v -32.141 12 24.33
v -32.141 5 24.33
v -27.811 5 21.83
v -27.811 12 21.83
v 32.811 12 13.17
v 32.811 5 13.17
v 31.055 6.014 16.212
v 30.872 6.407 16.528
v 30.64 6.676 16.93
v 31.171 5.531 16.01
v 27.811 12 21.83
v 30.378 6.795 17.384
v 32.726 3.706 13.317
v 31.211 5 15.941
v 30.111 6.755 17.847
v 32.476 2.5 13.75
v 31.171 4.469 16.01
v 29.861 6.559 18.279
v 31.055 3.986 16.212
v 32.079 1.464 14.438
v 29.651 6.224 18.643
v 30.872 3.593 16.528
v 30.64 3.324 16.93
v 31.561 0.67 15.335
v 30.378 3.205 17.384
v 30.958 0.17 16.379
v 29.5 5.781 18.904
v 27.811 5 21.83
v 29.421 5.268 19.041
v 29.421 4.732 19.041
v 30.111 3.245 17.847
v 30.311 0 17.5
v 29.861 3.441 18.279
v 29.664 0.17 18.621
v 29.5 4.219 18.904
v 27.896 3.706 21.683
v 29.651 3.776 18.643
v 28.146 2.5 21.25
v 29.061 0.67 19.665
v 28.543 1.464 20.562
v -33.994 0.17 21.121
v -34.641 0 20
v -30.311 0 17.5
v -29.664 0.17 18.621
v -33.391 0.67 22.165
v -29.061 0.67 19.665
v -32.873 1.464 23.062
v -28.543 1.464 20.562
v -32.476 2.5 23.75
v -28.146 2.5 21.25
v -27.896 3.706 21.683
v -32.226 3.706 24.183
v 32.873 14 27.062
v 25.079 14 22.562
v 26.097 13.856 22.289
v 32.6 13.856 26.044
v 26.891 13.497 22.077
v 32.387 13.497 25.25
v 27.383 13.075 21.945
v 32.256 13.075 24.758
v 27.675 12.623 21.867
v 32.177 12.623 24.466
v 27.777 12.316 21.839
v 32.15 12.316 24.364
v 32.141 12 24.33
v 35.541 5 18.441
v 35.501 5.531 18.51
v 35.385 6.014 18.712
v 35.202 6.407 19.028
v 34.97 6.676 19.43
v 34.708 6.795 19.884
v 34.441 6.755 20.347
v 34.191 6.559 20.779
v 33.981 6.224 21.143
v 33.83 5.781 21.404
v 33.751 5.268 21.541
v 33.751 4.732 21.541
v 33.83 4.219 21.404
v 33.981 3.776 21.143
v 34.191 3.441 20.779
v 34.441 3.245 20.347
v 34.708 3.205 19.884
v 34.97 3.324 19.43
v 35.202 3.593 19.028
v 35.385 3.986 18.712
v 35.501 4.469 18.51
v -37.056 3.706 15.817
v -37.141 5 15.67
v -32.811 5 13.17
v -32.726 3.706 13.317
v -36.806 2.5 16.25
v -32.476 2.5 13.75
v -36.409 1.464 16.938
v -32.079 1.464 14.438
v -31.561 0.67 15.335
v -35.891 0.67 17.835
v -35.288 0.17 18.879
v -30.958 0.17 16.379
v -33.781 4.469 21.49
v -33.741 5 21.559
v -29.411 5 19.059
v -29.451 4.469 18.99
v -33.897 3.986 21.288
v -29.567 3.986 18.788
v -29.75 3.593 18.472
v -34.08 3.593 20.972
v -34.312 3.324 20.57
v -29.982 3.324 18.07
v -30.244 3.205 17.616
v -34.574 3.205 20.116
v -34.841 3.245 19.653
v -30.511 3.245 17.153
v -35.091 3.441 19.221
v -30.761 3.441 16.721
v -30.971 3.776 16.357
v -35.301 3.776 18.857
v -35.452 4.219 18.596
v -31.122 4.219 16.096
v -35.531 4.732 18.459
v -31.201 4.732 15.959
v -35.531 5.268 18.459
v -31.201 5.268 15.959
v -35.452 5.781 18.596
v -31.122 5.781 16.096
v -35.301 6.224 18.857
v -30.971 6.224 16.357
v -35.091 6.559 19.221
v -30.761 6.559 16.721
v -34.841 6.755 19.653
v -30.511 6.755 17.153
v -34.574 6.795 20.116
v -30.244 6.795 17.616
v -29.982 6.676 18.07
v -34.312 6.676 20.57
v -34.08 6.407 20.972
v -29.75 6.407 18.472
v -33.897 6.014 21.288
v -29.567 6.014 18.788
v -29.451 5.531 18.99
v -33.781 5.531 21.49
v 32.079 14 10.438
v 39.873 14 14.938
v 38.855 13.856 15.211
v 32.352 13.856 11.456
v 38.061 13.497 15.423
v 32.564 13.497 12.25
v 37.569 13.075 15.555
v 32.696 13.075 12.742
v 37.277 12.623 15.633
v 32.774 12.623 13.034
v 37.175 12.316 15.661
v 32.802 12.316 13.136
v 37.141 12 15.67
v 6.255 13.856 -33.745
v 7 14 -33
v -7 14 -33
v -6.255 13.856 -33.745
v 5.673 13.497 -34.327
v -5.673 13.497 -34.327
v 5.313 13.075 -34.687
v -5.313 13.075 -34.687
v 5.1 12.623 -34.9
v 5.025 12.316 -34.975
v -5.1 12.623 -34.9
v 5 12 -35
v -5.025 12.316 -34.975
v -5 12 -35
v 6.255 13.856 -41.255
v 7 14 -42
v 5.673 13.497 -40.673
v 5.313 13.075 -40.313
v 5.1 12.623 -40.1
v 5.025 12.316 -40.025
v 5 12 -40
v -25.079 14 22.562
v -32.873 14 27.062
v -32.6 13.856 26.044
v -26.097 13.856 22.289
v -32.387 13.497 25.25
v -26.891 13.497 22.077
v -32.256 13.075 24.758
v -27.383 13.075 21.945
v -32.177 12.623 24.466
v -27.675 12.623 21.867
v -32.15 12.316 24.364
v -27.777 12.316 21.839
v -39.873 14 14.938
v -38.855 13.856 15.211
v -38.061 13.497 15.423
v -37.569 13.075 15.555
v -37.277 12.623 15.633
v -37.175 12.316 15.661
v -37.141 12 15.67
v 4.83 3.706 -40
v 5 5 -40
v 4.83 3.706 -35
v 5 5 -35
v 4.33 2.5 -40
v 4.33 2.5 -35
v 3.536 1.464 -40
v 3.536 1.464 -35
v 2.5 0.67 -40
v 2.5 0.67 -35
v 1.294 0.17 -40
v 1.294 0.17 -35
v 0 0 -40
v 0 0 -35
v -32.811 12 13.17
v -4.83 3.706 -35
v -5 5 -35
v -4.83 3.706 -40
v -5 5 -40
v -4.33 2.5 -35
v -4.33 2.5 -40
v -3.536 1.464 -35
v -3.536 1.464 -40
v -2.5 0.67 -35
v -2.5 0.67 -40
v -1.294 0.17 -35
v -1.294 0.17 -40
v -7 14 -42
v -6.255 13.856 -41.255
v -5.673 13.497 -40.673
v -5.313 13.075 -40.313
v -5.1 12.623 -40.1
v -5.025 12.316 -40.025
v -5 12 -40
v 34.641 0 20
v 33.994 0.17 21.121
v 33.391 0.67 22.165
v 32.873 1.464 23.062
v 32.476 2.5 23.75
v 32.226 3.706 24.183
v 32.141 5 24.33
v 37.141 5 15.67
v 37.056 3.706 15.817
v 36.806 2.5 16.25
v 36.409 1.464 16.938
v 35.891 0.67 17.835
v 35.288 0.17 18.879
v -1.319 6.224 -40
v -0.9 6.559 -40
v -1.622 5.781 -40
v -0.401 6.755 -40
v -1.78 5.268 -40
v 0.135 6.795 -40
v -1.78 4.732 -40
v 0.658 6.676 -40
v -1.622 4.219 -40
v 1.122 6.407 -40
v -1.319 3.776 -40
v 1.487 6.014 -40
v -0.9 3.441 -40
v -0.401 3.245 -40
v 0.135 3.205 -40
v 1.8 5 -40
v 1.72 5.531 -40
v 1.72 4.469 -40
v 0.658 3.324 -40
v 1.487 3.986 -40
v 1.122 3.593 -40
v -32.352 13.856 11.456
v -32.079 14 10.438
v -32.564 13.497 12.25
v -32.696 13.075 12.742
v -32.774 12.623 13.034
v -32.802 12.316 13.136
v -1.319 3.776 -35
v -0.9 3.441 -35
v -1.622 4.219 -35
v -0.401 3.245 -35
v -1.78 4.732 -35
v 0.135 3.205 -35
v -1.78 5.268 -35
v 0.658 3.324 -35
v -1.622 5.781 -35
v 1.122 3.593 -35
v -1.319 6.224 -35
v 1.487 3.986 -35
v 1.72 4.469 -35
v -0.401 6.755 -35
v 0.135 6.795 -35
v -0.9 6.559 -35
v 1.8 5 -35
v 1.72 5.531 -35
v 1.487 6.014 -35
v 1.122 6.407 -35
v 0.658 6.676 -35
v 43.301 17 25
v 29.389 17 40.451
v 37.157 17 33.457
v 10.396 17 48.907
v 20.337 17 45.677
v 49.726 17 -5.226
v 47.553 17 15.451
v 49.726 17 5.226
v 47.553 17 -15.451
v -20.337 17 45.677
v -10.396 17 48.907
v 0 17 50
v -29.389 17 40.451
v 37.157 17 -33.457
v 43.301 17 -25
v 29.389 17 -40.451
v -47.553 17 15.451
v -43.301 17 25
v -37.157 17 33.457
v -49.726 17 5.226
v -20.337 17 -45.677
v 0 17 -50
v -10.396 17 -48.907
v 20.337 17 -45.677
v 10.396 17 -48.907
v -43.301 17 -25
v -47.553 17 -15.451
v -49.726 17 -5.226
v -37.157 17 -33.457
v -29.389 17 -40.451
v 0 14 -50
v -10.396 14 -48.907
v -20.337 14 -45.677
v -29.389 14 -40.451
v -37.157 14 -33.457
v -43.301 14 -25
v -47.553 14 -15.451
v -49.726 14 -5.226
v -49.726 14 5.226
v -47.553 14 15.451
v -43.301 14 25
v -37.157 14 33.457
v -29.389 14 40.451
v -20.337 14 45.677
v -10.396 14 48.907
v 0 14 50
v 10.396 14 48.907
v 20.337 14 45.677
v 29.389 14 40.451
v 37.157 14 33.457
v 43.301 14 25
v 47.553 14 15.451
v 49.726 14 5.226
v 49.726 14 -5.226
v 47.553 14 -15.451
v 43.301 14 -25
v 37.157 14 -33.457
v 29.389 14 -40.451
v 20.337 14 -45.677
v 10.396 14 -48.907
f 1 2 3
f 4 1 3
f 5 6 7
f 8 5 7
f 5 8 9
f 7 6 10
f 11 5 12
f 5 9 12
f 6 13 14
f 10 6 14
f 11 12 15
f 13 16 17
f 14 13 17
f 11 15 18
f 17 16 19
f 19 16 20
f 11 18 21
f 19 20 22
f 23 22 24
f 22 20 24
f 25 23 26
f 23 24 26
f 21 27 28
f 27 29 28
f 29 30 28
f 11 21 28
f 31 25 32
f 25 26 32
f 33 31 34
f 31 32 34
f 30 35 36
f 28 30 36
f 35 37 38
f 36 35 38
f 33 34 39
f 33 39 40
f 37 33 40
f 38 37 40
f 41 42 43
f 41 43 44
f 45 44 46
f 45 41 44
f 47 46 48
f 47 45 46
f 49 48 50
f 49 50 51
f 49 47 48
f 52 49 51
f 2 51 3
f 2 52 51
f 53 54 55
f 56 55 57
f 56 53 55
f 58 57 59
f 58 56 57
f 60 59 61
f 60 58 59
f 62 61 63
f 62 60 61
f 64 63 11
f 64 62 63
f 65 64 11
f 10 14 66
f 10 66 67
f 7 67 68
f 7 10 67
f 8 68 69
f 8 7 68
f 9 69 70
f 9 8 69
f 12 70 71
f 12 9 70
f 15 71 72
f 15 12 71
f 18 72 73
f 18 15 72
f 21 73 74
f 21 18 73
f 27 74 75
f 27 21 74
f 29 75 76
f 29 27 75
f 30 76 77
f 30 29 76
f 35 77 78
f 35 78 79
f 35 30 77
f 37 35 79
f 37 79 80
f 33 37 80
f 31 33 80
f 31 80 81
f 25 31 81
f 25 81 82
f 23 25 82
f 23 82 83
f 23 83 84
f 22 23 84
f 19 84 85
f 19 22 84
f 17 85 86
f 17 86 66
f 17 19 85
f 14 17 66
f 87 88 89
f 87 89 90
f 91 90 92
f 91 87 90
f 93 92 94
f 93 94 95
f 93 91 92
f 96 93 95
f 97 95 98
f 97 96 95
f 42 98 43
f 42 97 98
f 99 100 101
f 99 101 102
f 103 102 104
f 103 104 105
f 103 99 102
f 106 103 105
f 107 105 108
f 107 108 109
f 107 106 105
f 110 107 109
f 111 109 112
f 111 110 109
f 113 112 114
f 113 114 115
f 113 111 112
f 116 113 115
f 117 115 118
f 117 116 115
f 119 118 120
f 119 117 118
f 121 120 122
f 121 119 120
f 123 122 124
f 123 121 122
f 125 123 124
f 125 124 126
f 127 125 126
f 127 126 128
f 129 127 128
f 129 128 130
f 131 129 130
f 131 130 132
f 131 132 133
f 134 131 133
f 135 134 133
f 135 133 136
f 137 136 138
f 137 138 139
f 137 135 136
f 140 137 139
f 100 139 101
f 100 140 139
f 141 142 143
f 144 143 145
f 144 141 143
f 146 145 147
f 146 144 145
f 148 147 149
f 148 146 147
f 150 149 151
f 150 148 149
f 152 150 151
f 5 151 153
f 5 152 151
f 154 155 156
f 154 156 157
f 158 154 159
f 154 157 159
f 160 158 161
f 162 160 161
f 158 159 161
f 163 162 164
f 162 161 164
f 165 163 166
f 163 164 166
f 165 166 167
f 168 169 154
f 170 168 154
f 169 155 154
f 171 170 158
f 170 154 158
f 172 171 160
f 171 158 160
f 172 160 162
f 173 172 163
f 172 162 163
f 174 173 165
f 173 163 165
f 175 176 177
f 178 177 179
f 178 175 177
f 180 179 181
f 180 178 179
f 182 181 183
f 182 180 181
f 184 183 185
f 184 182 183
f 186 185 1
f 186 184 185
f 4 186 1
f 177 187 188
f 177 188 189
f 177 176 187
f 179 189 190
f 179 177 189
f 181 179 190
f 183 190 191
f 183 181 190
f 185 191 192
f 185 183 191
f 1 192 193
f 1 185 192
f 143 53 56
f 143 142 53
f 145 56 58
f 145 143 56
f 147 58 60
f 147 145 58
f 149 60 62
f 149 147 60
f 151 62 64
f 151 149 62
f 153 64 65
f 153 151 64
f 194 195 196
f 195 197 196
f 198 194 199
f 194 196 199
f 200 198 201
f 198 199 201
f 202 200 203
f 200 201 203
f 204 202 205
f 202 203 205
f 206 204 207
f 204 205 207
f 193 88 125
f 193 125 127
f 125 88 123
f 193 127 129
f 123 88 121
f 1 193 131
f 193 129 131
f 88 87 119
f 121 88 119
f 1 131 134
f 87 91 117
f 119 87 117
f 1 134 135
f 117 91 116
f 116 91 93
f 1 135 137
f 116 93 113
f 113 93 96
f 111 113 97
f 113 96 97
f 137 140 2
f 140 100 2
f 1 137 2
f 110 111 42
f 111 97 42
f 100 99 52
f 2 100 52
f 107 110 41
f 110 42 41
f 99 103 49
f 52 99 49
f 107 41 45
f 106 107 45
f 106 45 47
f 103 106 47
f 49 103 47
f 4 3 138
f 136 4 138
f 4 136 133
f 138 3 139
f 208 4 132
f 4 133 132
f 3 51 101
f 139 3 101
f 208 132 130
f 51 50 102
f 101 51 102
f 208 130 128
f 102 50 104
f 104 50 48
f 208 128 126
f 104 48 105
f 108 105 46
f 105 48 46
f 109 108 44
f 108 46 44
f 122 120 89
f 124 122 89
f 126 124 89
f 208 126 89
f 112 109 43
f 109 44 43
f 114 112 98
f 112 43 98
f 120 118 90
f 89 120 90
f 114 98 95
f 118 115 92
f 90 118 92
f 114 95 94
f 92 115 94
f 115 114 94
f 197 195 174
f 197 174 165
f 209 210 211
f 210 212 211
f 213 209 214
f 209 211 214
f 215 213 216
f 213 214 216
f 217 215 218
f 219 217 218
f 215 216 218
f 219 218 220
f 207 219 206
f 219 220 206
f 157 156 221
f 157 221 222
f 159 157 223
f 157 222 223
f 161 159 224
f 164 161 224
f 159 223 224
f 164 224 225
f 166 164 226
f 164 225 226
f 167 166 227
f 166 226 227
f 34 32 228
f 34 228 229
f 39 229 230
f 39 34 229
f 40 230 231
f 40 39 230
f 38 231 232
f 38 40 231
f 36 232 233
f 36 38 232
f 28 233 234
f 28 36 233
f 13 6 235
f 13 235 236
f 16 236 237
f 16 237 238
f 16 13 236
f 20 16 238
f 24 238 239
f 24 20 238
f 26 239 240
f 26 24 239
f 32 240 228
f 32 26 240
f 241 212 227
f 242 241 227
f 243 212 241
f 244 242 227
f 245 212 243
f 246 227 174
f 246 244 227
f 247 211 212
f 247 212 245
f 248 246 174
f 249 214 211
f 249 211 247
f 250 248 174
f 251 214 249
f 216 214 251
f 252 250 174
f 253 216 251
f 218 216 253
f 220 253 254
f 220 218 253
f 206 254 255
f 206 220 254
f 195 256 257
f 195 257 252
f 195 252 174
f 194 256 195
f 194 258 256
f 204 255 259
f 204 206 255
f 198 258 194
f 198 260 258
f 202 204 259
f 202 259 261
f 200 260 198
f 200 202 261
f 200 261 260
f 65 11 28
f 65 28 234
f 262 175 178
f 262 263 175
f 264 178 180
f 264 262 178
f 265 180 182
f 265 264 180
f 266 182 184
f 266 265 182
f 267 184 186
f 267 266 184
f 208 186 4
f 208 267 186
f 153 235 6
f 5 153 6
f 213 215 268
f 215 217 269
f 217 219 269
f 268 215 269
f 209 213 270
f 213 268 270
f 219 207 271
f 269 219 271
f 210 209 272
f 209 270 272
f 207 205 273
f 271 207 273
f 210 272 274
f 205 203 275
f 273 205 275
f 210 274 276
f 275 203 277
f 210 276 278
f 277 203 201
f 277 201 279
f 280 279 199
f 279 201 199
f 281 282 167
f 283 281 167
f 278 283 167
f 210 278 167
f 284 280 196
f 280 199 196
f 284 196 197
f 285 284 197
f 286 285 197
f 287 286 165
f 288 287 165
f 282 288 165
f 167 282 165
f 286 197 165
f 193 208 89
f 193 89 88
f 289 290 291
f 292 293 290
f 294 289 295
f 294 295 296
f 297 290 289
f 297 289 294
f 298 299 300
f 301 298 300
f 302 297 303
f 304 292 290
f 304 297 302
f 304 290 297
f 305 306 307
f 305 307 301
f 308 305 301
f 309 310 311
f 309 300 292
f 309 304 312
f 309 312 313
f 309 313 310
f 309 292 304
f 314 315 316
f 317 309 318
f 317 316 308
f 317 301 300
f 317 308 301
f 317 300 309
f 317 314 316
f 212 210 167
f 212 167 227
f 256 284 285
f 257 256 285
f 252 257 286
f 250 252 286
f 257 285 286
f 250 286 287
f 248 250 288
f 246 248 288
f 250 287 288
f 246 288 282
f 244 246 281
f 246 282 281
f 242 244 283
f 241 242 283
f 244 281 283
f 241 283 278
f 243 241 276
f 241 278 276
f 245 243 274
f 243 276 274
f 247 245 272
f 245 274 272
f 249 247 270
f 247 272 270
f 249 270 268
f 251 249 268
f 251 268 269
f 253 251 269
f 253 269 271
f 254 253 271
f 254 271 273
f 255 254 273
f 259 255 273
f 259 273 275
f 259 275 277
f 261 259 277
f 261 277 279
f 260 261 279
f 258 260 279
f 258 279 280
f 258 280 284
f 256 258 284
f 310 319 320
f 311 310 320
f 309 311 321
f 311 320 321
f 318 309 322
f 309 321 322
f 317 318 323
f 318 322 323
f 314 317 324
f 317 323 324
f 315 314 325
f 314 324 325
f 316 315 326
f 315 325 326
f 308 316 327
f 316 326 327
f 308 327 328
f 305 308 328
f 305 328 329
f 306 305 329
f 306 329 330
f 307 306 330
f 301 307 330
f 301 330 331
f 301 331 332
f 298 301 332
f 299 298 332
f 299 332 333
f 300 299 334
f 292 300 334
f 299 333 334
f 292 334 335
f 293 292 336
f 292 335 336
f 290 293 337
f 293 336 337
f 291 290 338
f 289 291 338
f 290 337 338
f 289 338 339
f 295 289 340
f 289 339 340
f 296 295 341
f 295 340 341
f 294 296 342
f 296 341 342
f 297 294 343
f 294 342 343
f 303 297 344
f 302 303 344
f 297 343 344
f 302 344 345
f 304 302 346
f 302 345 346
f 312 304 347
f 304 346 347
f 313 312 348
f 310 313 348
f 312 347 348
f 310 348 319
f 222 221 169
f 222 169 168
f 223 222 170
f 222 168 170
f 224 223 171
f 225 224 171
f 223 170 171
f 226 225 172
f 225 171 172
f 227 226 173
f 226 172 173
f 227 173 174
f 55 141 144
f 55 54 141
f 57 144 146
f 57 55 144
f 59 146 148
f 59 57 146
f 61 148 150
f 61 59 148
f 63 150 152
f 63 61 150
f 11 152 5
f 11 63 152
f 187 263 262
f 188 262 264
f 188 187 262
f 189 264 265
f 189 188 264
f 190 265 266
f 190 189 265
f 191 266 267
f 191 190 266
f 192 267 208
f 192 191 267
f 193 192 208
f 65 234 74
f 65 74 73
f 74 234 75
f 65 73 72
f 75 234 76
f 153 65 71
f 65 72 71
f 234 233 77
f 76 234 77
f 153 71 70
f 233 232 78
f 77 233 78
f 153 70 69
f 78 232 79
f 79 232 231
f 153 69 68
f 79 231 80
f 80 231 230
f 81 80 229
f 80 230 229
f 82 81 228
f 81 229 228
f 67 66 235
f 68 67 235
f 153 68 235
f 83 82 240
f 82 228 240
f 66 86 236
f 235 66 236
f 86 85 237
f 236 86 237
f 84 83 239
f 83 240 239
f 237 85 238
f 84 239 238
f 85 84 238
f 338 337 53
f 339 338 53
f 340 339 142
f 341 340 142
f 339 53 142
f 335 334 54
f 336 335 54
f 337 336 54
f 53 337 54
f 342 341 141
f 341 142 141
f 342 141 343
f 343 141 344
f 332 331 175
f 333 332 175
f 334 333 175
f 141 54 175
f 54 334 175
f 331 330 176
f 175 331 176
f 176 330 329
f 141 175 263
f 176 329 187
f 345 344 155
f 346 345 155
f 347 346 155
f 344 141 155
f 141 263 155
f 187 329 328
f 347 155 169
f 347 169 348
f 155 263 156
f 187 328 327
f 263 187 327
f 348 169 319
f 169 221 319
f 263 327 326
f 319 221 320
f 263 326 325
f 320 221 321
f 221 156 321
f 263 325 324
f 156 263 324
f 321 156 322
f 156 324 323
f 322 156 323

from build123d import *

# Parameters (mm, degrees)
BOSS_EXTRUDE1_DEPTH     = 17
CUT_EXTRUDE1_REACH      = 46.598
SKETCH3_W               = 35
SKETCH3_H               = 14
FILLET1_R               = 5
M3_CLEARANCE_HOLE1_D    = 3.6
CIRPATTERN1_START       = 14
CIRPATTERN1_DEPTH       = 3
CIRPATTERN1_START_2     = 6.8000001
CIRPATTERN1_2_DEPTH     = 7.1999999
CIRPATTERN1_3_DEPTH     = 6.8000001
CIRPATTERN1_START_3     = -40
CIRPATTERN1_4_OUTLINE_R = 1.8
CIRPATTERN1_4_DEPTH     = 5
CIRPATTERN1_START_4     = 35
CIRPATTERN1_5_OUTLINE_R = 1.8
CIRPATTERN1_5_DEPTH     = 5
SKETCH6_R               = 50
BOSS_EXTRUDE2_DEPTH     = 3
FILLET6_R               = 2


with BuildPart() as part:
    # Sketch2 → Boss-Extrude1 (new body)
    with BuildSketch(Plane(origin=(0, 0, 0), x_dir=(1, 0, 0), z_dir=(0, 1, 0))):
        Polygon((0, 0), (-5, 2.886751346), (-5, 40), (5, 40), (5, 2.886751346), align=None)
    extrude(amount=BOSS_EXTRUDE1_DEPTH)

    # Sketch3 → Cut-Extrude1 (cut, up to next)
    with BuildSketch(Plane(origin=(5, 0, 0), x_dir=(0, 0, -1), z_dir=(1, 0, 0)), mode=Mode.PRIVATE) as cut_extrude1_sk1:
        with Locations((17.5, 7)):
            Rectangle(SKETCH3_W, SKETCH3_H)
    cut_extrude1_tool1 = extrude(cut_extrude1_sk1.sketch, amount=-CUT_EXTRUDE1_REACH, mode=Mode.PRIVATE) & part.part
    add(cut_extrude1_tool1.solids().sort_by_distance((5, 7, -17.5))[0], mode=Mode.SUBTRACT)

    # Fillet1
    fillet1_edges = [part.edges().sort_by_distance(p)[0] for p in [
        (-5, 0, -37.5),
        (5, 0, -37.5),
    ]]
    fillet(fillet1_edges, radius=FILLET1_R - 0.0001)  # a hair under: the kernel refuses the full size

    # M3 Clearance Hole1 (through all)
    with Locations(Plane(origin=(0, 0, -40), x_dir=(-1, 0, 0), z_dir=(0, 0, -1))):
        with Locations((0, 5)):
            Hole(M3_CLEARANCE_HOLE1_D / 2)

    # CirPattern1: read off the stored shape, not the designer's step
    # CirPattern1 outline → CirPattern1 (add)
    with BuildSketch(Plane(origin=(0, 0, 0), x_dir=(1, 0, 0), z_dir=(0, 1, 0)).offset(CIRPATTERN1_START)):
        Polygon((-37.141016151, -15.669872981), (-32.141016151, -24.330127019), (0, -5.773502692), (32.141016151, -24.330127019), (37.141016151, -15.669872981), (5, 2.886751346), (0, 0), (-5, 2.886751346), align=None)
    extrude(amount=CIRPATTERN1_DEPTH)

    # CirPattern1 2 outline → CirPattern1 2 (add)
    with BuildSketch(Plane(origin=(0, 0, 0), x_dir=(1, 0, 0), z_dir=(0, 1, 0)).offset(CIRPATTERN1_START_2)):
        Polygon((-32.810889132, -13.169872981), (-37.141016151, -15.669872981), (-32.141016151, -24.330127019), (-27.810889132, -21.830127019), align=None)
        Polygon((32.810889132, -13.169872981), (27.810889132, -21.830127019), (32.141016151, -24.330127019), (37.141016151, -15.669872981), align=None)
    extrude(amount=CIRPATTERN1_2_DEPTH)

    # CirPattern1 3 outline → CirPattern1 3 (add)
    with BuildSketch(Plane(origin=(0, 0, 0), x_dir=(1, 0, 0), z_dir=(0, 1, 0))):
        Polygon((32.810889132, -13.169872981), (27.810889132, -21.830127019), (32.141016151, -24.330127019), (37.141016151, -15.669872981), align=None)
        Polygon((-32.810889132, -13.169872981), (-37.141016151, -15.669872981), (-32.141016151, -24.330127019), (-27.810889132, -21.830127019), align=None)
    extrude(amount=CIRPATTERN1_3_DEPTH)

    # CirPattern1 4 outline → CirPattern1 4 (cut)
    with BuildSketch(Plane(origin=(0, 0, 0), x_dir=(0.500000000000006, 0, 0.8660254037844353), z_dir=(0.8660254037844352, 0, -0.5000000000000061)).offset(CIRPATTERN1_START_3)):
        with BuildLine():
            Line((5, 0), (0, 0))
            ThreePointArc((0, 0), (3.535533906, -1.464466094), (5, -5))
            Line((5, -5), (5, 0))
        make_face()
        with BuildLine():
            ThreePointArc((-5, -5), (-3.535533906, -1.464466094), (0, 0))
            Line((0, 0), (-5, 0))
            Line((-5, 0), (-5, -5))
        make_face()
        with Locations((0, -5)):
            Circle(CIRPATTERN1_4_OUTLINE_R)
    extrude(amount=CIRPATTERN1_4_DEPTH, mode=Mode.SUBTRACT)

    # CirPattern1 5 outline → CirPattern1 5 (cut)
    with BuildSketch(Plane(origin=(0, 0, 0), x_dir=(0.4999999999999894, 0, -0.8660254037844448), z_dir=(0.8660254037844447, 0, 0.4999999999999898)).offset(CIRPATTERN1_START_4)):
        with BuildLine():
            Line((-5, 0), (0, 0))
            ThreePointArc((0, 0), (-3.535533906, 1.464466094), (-5, 5))
            Line((-5, 5), (-5, 0))
        make_face()
        with BuildLine():
            ThreePointArc((5, 5), (3.535533906, 1.464466094), (0, 0))
            Line((0, 0), (5, 0))
            Line((5, 0), (5, 5))
        make_face()
        with Locations((0, 5)):
            Circle(CIRPATTERN1_5_OUTLINE_R)
    extrude(amount=CIRPATTERN1_5_DEPTH, mode=Mode.SUBTRACT)

    # Sketch6 → Boss-Extrude2 (add)
    with BuildSketch(Plane(origin=(0, 14, 0), x_dir=(1, 0, 0), z_dir=(0, 1, 0))):
        with Locations(Location((0, 0, 0), (0, 0, 90))):
            Circle(SKETCH6_R)
    extrude(amount=BOSS_EXTRUDE2_DEPTH)

    # Fillet6
    fillet6_edges = [part.edges().sort_by_distance(p)[0] for p in [
        (5, 14, -37.5),
        (0, 14, -40),
        (-5, 14, -37.5),
        (-34.975952642, 14, 14.419872981),
        (-34.641016151, 14, 20),
        (-29.975952642, 14, 23.080127019),
        (29.975952642, 14, 23.080127019),
        (34.641016151, 14, 20),
        (34.975952642, 14, 14.419872981),
        (0, 14, -35),
        (-30.310889132, 14, 17.5),
        (30.310889132, 14, 17.5),
    ]]
    fillet(fillet6_edges, radius=FILLET6_R)


solid = part.part
